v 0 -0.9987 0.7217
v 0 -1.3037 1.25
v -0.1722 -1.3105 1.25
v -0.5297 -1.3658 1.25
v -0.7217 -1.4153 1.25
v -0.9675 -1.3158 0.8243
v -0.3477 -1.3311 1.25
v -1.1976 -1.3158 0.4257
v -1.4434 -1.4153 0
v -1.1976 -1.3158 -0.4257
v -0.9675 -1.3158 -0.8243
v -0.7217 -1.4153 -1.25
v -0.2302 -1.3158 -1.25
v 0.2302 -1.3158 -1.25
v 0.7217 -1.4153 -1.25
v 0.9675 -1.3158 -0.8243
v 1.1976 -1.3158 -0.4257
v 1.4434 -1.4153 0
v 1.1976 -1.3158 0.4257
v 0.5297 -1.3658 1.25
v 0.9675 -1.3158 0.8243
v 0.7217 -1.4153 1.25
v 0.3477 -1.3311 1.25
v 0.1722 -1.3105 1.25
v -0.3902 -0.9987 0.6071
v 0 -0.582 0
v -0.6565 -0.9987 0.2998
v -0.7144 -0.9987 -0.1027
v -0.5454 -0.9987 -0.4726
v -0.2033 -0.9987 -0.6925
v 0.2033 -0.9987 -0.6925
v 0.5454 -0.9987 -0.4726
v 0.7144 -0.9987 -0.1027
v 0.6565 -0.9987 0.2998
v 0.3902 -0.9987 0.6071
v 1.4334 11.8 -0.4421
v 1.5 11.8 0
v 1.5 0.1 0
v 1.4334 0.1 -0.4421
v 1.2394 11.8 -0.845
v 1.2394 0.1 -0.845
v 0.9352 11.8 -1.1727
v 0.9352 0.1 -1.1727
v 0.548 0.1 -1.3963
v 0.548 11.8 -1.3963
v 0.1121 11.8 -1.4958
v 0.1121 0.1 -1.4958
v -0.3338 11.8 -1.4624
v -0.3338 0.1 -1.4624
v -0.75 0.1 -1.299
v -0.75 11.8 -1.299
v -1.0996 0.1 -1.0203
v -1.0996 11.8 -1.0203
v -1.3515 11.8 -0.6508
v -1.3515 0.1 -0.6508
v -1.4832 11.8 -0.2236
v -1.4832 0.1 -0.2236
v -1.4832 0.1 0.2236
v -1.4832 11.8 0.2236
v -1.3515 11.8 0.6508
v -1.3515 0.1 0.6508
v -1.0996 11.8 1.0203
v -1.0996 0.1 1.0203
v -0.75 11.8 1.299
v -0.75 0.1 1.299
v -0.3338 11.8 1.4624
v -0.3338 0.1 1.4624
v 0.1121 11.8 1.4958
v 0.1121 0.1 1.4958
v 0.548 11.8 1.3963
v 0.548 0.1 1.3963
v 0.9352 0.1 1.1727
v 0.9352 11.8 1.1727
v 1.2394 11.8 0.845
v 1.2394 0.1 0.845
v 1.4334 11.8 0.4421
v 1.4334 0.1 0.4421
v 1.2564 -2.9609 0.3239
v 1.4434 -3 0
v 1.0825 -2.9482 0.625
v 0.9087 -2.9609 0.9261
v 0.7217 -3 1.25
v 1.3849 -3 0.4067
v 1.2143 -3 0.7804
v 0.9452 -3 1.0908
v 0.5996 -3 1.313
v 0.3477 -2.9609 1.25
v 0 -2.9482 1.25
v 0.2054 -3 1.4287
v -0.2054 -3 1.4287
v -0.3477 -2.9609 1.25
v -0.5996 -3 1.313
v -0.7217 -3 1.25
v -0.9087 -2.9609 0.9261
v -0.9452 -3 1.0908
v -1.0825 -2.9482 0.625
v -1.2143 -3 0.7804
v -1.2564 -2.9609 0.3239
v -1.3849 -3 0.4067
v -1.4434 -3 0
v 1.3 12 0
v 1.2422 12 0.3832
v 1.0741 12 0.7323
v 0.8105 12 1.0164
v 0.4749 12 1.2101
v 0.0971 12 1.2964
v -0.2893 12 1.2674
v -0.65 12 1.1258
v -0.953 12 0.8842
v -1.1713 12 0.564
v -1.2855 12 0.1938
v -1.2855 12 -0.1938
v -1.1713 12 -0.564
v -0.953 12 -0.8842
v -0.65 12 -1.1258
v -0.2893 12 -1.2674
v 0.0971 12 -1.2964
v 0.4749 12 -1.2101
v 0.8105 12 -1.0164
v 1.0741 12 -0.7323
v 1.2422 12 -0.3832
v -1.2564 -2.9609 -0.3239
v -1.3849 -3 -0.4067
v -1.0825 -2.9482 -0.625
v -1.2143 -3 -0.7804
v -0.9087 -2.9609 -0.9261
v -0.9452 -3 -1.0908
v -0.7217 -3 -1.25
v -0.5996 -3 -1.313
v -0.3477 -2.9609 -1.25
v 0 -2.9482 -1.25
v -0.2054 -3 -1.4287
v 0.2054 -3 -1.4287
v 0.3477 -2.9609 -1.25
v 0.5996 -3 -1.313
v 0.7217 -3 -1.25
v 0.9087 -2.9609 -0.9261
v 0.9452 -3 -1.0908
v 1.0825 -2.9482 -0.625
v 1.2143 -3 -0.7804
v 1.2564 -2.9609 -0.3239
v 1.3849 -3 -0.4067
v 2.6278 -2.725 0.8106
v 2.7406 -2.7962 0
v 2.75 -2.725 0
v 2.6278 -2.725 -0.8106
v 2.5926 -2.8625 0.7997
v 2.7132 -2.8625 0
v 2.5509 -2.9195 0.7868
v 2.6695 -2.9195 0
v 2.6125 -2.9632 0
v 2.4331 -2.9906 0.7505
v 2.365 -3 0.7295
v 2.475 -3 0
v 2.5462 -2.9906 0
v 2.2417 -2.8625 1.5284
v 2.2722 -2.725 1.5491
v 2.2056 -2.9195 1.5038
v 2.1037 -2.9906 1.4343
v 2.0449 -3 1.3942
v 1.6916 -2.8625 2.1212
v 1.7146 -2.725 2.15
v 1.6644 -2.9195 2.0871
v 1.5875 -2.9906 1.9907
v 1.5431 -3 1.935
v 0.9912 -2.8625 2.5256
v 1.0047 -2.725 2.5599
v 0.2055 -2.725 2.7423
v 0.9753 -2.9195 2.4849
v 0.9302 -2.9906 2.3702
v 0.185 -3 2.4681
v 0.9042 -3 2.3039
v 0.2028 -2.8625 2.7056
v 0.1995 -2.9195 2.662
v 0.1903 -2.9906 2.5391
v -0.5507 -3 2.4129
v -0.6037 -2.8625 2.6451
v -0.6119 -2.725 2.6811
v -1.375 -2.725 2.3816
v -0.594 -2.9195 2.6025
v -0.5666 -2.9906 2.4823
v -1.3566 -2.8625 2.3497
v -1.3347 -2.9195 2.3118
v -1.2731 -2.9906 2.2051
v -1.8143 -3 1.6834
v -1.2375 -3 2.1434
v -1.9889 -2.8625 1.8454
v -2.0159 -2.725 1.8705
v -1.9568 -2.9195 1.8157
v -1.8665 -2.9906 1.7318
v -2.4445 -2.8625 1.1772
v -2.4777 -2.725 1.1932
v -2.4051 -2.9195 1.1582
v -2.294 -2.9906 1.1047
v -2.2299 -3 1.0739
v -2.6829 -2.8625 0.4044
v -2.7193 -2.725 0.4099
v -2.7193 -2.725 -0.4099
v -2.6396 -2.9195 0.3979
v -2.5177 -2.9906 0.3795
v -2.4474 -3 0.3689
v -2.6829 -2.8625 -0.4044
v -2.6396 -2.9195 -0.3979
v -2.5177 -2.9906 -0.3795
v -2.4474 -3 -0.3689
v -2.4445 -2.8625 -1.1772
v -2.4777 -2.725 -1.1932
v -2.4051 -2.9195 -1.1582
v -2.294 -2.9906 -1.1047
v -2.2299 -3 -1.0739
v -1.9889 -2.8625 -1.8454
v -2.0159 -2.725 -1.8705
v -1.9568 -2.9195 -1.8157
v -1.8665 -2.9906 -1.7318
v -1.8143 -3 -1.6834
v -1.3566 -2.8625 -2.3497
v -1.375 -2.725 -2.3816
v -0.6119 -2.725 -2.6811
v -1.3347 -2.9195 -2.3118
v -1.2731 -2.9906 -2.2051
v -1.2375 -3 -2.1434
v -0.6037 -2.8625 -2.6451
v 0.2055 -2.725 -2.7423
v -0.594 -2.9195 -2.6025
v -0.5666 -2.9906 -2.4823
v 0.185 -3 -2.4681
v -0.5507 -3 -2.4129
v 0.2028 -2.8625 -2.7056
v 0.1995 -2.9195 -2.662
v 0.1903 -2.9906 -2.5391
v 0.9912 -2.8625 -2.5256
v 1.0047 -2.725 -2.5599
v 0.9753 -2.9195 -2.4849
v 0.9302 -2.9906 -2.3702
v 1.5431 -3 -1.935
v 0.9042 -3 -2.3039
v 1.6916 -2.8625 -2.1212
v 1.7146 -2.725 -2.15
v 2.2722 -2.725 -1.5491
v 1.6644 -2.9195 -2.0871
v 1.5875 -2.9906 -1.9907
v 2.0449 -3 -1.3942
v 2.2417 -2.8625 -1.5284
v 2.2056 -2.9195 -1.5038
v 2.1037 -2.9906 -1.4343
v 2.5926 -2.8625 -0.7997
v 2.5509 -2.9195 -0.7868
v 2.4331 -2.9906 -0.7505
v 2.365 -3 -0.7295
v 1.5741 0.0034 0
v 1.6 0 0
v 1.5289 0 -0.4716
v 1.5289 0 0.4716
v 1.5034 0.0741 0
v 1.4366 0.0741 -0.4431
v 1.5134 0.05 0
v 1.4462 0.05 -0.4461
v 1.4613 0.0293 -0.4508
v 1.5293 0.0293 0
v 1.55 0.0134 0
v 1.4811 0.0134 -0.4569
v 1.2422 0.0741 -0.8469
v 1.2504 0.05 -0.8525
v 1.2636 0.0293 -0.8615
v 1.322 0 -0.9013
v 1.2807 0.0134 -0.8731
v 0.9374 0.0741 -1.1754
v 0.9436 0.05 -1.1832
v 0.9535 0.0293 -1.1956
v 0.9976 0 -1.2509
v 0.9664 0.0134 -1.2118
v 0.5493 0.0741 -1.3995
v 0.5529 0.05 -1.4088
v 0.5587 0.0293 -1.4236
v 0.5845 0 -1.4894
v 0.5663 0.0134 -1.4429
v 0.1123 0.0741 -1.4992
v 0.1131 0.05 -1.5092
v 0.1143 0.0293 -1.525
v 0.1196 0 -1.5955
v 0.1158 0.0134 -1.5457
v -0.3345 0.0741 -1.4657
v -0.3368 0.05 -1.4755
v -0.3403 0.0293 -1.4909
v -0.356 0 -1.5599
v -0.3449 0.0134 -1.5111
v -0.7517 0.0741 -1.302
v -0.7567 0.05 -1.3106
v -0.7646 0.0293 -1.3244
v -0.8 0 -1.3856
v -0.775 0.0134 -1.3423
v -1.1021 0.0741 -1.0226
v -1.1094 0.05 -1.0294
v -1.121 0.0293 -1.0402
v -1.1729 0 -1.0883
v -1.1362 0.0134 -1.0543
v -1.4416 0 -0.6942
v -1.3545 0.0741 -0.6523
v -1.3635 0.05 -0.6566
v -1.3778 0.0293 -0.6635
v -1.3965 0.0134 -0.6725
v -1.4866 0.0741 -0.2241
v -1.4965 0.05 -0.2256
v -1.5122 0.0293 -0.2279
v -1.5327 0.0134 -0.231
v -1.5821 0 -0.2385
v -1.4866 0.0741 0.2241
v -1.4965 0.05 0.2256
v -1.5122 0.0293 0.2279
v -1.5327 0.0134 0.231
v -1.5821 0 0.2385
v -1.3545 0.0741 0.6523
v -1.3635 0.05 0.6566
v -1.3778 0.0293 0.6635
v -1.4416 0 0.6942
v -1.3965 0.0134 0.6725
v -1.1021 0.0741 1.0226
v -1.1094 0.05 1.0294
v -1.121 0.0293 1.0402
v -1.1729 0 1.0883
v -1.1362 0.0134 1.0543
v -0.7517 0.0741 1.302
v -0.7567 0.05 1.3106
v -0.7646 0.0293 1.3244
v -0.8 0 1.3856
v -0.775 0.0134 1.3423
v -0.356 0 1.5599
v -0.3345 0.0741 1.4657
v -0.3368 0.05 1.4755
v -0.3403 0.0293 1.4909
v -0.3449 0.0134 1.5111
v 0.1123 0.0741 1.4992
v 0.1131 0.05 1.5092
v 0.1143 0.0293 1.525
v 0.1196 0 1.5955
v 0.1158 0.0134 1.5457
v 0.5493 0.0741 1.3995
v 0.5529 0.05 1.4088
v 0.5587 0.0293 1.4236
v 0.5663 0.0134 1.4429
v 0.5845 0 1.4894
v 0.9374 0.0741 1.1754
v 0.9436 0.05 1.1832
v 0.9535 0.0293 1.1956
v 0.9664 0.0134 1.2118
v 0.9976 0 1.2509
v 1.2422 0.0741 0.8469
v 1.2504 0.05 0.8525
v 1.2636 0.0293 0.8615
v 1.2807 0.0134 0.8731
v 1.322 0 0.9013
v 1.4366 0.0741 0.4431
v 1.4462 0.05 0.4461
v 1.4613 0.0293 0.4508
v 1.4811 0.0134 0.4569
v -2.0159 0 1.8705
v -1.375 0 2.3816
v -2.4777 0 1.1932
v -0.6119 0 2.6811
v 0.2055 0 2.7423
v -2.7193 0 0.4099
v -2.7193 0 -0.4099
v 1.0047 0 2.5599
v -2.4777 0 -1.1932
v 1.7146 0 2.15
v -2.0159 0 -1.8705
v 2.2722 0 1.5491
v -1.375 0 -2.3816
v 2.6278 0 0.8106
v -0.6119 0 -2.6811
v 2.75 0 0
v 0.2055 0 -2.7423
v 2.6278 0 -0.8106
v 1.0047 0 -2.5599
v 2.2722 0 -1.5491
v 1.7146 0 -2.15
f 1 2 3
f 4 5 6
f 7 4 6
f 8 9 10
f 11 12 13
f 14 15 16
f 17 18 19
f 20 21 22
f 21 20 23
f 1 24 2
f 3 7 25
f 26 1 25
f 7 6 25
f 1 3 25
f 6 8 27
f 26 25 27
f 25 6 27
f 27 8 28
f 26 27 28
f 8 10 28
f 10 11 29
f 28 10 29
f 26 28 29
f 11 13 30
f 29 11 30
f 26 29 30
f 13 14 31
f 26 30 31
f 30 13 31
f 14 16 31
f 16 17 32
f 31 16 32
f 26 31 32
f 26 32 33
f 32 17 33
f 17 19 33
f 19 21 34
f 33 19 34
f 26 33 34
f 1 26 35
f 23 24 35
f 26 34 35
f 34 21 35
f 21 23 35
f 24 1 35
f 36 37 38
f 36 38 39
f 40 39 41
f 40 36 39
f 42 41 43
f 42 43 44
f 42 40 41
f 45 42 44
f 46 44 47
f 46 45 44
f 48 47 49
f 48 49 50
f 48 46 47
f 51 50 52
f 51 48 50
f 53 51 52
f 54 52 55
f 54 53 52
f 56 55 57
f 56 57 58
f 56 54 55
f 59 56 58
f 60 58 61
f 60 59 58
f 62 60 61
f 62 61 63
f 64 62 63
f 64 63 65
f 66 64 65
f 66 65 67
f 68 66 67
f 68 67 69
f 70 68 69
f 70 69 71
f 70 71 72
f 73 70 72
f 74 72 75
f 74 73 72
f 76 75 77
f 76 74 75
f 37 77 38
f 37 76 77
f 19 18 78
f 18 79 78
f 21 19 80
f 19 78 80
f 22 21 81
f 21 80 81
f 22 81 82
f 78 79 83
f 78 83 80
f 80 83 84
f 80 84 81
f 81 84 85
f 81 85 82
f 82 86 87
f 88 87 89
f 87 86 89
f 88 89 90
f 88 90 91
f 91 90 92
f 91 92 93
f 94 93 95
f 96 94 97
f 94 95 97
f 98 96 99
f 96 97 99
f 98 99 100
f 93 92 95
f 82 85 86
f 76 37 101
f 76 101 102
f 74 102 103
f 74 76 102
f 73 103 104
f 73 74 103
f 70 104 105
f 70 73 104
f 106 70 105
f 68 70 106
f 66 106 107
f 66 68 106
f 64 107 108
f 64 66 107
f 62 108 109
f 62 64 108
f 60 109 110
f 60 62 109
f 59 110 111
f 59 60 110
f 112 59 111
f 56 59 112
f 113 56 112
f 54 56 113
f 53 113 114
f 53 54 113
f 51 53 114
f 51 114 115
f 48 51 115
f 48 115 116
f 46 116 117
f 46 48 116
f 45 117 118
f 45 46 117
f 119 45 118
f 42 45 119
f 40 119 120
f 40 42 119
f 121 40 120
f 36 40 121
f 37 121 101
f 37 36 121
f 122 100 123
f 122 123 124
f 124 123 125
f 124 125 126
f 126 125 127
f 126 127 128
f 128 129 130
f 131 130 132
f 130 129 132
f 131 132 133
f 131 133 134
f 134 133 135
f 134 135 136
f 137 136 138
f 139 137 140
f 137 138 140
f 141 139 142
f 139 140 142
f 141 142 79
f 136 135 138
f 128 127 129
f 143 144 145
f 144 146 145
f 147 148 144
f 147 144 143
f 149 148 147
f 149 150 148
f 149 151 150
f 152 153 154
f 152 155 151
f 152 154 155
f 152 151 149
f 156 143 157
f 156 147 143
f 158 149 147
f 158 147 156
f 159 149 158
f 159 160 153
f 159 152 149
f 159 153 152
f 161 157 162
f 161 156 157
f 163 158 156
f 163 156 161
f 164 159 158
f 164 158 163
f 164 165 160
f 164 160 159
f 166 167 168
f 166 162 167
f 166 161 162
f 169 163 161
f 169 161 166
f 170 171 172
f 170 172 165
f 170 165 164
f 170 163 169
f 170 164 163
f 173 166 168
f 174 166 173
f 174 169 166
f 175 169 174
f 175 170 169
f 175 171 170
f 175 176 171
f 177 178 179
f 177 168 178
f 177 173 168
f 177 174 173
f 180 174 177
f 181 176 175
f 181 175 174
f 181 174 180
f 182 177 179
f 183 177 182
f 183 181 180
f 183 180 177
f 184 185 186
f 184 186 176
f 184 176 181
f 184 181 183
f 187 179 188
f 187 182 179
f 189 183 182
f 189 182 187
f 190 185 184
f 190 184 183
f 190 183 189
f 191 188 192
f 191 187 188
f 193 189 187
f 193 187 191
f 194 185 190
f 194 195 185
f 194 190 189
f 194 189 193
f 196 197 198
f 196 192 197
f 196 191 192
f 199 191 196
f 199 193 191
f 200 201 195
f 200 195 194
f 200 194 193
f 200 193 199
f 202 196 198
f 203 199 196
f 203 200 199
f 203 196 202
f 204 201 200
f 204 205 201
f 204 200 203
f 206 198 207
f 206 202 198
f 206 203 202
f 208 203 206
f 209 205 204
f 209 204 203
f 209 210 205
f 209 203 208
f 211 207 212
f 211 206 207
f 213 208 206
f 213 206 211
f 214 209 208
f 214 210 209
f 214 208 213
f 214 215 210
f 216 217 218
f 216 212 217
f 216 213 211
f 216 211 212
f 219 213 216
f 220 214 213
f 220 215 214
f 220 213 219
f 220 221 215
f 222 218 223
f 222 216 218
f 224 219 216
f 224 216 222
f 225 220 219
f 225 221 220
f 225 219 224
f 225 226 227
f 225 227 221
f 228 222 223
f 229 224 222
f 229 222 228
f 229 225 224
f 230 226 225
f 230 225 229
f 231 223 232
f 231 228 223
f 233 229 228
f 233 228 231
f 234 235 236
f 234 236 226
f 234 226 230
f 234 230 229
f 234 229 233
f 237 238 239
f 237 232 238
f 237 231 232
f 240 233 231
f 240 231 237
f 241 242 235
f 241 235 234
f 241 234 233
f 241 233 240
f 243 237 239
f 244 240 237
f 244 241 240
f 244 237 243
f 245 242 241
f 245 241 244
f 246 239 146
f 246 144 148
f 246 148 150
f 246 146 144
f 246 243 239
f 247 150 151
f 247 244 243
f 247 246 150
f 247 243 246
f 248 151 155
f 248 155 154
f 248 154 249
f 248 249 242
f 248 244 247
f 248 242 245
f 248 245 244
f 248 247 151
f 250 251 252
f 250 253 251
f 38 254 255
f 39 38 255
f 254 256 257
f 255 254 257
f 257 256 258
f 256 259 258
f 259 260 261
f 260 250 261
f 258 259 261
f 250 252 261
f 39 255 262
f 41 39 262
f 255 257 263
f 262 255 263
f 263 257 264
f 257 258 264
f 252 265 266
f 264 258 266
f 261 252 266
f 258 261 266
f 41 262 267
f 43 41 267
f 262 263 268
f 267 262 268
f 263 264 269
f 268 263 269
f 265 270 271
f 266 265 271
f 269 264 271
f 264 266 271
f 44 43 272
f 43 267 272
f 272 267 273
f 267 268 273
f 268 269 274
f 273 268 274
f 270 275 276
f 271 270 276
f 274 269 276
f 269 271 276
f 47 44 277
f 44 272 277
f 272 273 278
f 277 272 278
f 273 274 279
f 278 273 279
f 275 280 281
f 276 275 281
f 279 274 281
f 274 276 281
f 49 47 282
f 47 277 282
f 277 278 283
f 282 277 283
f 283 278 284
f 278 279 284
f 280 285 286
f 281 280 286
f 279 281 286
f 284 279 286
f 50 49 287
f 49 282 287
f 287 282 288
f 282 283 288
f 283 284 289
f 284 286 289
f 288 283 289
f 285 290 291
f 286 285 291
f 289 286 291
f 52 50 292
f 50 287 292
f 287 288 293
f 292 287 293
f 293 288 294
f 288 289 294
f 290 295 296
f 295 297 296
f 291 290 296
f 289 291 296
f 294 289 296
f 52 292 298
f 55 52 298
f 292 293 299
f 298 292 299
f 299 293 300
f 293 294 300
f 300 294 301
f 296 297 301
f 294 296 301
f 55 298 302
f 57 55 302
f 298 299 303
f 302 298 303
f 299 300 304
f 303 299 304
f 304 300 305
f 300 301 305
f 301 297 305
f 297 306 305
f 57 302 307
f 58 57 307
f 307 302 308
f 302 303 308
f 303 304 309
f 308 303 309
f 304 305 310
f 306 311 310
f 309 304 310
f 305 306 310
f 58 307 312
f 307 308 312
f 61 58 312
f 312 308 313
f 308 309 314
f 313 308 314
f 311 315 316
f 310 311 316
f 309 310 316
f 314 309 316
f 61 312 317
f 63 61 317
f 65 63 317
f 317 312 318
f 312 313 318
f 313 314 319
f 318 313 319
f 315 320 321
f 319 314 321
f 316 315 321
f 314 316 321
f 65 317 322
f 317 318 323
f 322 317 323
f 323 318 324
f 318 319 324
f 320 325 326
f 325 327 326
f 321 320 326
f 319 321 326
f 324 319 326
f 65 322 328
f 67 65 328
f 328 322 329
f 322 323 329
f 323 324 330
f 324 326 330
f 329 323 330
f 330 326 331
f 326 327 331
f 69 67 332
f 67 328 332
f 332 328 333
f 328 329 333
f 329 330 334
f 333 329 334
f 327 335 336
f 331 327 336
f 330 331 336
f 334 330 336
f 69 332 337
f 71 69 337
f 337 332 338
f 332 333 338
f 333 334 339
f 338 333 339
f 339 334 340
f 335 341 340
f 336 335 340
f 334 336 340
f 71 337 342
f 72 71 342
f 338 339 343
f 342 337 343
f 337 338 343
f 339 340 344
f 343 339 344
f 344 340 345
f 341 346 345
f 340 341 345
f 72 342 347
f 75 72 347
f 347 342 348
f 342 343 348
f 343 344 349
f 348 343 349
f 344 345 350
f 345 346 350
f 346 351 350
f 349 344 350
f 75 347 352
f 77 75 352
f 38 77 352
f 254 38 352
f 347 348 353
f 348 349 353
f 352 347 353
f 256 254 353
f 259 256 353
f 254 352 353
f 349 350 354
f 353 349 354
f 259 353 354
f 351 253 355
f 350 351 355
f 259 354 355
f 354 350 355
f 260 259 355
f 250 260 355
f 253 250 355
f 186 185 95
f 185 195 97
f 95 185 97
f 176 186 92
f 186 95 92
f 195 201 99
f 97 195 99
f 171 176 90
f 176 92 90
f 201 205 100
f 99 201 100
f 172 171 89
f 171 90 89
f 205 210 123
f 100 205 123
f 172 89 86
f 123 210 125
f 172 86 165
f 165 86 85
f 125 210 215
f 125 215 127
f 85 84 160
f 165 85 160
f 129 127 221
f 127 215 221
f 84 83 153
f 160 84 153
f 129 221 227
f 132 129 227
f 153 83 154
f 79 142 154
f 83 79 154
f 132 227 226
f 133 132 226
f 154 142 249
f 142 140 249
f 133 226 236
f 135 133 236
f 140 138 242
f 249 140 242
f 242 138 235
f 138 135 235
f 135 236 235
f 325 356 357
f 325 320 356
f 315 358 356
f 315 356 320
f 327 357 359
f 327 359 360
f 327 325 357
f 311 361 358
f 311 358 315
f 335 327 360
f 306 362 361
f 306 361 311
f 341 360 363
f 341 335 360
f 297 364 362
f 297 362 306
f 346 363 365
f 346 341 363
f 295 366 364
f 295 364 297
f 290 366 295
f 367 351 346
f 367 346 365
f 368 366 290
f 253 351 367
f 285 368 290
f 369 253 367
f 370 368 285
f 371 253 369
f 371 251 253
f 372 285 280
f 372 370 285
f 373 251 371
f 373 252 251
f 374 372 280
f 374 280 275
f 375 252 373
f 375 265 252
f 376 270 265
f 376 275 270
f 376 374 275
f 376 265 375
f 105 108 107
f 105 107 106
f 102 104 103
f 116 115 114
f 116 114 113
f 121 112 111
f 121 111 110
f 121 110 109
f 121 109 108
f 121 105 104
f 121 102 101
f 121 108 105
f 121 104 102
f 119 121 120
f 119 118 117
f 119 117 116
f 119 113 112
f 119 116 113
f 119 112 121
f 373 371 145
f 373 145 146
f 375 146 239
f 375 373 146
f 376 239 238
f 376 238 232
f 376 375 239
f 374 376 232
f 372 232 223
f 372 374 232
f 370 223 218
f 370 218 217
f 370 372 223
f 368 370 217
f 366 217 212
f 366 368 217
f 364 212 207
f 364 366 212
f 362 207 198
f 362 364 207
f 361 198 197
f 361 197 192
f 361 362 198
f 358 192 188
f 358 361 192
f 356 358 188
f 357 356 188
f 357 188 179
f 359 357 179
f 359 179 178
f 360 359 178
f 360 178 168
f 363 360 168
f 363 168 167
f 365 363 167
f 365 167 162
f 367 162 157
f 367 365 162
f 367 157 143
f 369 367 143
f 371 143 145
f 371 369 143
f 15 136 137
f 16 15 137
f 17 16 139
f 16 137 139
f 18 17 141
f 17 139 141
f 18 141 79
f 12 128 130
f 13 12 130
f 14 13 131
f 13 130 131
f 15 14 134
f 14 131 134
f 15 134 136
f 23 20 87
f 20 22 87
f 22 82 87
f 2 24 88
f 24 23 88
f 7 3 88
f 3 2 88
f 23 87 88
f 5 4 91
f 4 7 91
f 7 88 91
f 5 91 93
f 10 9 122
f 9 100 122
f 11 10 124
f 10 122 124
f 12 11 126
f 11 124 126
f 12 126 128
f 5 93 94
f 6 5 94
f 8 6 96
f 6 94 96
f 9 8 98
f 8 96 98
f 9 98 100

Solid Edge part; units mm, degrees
sketch "Sketch1" plane through (0, 0, 0) normal (0, 0, 1) x (1, 0, 0)
  line L0 (1.5, 0) -> (1.5, 12)
  line L1 (0, 12) -> (1.5, 12)
  line L2 (0, 0) -> (0, 12)
  line L3 (0, 0) -> (0, -3)
  line L4 (0, -3) -> (2.75, -3)
  line L5 (2.75, -3) -> (2.75, 0)
  line L6 (2.75, 0) -> (1.5, 0)
revolve "RevolvedProtrusion1" add sketch "Sketch1" angle 360 about axis through (0, 0, 0) along (0, 1, 0)
sketch "Sketch2" plane through (0, 0, 0) normal (1, 0, 0) x (0, 1, 0)
  line L0 (-3, 1.9365) -> (-1.7, 1.9365)
  line L1 (-0.582, 0) -> (-1.7, 1.9365)
  line L2 (-3, 0) -> (-0.582, 0)
  line L3 (-3, 0) -> (-3, 1.9365)
revolve "RevolvedCutout1" cut sketch "Sketch2" angle 360 about axis through (0, -4.5, 0) along (0, 1, 0)
sketch "Sketch3" plane through (0, -3, 0) normal (0, -1, 0) x (0, 0, 1)
  circle A0 centre (0, 0) radius 1.9365
  line L0 (-1.25, -0.7217) -> (0, -1.4434)
  line L1 (0, -1.4434) -> (1.25, -0.7217)
  line L2 (1.25, -0.7217) -> (1.25, 0.7217)
  line L3 (1.25, 0.7217) -> (0, 1.4434)
  line L4 (0, 1.4434) -> (-1.25, 0.7217)
  line L5 (-1.25, 0.7217) -> (-1.25, -0.7217)
  dimension "D1" = 2.5
extrude "Protrusion1" add sketch "Sketch3" against normal up to next
sketch "Sketch4" plane through (0, 0, 0) normal (0, 0, 1) x (1, 0, 0)
  line L0 (-1.4434, -3) -> (0, -3)
  line L1 (0, -3) -> (0, -2.6132)
  line L2 (0, -2.6132) -> (-1.4434, -3)
revolve "RevolvedCutout2" cut sketch "Sketch4" angle 360 about axis through (0, -4.5, 0) along (0, 1, 0)
fillet "Round1" radius 0.1 1 edges at (0, 0, -1.5)
fillet "Round2" radius 0.275 1 edges at (0, -3, -2.75)
chamfer "倒斜角_2" distance 0.2 angle 45 1 edges at (0, 12, -1.5)
cosmetic_thread "螺纹_3" size "M3" thread depth 9.6
